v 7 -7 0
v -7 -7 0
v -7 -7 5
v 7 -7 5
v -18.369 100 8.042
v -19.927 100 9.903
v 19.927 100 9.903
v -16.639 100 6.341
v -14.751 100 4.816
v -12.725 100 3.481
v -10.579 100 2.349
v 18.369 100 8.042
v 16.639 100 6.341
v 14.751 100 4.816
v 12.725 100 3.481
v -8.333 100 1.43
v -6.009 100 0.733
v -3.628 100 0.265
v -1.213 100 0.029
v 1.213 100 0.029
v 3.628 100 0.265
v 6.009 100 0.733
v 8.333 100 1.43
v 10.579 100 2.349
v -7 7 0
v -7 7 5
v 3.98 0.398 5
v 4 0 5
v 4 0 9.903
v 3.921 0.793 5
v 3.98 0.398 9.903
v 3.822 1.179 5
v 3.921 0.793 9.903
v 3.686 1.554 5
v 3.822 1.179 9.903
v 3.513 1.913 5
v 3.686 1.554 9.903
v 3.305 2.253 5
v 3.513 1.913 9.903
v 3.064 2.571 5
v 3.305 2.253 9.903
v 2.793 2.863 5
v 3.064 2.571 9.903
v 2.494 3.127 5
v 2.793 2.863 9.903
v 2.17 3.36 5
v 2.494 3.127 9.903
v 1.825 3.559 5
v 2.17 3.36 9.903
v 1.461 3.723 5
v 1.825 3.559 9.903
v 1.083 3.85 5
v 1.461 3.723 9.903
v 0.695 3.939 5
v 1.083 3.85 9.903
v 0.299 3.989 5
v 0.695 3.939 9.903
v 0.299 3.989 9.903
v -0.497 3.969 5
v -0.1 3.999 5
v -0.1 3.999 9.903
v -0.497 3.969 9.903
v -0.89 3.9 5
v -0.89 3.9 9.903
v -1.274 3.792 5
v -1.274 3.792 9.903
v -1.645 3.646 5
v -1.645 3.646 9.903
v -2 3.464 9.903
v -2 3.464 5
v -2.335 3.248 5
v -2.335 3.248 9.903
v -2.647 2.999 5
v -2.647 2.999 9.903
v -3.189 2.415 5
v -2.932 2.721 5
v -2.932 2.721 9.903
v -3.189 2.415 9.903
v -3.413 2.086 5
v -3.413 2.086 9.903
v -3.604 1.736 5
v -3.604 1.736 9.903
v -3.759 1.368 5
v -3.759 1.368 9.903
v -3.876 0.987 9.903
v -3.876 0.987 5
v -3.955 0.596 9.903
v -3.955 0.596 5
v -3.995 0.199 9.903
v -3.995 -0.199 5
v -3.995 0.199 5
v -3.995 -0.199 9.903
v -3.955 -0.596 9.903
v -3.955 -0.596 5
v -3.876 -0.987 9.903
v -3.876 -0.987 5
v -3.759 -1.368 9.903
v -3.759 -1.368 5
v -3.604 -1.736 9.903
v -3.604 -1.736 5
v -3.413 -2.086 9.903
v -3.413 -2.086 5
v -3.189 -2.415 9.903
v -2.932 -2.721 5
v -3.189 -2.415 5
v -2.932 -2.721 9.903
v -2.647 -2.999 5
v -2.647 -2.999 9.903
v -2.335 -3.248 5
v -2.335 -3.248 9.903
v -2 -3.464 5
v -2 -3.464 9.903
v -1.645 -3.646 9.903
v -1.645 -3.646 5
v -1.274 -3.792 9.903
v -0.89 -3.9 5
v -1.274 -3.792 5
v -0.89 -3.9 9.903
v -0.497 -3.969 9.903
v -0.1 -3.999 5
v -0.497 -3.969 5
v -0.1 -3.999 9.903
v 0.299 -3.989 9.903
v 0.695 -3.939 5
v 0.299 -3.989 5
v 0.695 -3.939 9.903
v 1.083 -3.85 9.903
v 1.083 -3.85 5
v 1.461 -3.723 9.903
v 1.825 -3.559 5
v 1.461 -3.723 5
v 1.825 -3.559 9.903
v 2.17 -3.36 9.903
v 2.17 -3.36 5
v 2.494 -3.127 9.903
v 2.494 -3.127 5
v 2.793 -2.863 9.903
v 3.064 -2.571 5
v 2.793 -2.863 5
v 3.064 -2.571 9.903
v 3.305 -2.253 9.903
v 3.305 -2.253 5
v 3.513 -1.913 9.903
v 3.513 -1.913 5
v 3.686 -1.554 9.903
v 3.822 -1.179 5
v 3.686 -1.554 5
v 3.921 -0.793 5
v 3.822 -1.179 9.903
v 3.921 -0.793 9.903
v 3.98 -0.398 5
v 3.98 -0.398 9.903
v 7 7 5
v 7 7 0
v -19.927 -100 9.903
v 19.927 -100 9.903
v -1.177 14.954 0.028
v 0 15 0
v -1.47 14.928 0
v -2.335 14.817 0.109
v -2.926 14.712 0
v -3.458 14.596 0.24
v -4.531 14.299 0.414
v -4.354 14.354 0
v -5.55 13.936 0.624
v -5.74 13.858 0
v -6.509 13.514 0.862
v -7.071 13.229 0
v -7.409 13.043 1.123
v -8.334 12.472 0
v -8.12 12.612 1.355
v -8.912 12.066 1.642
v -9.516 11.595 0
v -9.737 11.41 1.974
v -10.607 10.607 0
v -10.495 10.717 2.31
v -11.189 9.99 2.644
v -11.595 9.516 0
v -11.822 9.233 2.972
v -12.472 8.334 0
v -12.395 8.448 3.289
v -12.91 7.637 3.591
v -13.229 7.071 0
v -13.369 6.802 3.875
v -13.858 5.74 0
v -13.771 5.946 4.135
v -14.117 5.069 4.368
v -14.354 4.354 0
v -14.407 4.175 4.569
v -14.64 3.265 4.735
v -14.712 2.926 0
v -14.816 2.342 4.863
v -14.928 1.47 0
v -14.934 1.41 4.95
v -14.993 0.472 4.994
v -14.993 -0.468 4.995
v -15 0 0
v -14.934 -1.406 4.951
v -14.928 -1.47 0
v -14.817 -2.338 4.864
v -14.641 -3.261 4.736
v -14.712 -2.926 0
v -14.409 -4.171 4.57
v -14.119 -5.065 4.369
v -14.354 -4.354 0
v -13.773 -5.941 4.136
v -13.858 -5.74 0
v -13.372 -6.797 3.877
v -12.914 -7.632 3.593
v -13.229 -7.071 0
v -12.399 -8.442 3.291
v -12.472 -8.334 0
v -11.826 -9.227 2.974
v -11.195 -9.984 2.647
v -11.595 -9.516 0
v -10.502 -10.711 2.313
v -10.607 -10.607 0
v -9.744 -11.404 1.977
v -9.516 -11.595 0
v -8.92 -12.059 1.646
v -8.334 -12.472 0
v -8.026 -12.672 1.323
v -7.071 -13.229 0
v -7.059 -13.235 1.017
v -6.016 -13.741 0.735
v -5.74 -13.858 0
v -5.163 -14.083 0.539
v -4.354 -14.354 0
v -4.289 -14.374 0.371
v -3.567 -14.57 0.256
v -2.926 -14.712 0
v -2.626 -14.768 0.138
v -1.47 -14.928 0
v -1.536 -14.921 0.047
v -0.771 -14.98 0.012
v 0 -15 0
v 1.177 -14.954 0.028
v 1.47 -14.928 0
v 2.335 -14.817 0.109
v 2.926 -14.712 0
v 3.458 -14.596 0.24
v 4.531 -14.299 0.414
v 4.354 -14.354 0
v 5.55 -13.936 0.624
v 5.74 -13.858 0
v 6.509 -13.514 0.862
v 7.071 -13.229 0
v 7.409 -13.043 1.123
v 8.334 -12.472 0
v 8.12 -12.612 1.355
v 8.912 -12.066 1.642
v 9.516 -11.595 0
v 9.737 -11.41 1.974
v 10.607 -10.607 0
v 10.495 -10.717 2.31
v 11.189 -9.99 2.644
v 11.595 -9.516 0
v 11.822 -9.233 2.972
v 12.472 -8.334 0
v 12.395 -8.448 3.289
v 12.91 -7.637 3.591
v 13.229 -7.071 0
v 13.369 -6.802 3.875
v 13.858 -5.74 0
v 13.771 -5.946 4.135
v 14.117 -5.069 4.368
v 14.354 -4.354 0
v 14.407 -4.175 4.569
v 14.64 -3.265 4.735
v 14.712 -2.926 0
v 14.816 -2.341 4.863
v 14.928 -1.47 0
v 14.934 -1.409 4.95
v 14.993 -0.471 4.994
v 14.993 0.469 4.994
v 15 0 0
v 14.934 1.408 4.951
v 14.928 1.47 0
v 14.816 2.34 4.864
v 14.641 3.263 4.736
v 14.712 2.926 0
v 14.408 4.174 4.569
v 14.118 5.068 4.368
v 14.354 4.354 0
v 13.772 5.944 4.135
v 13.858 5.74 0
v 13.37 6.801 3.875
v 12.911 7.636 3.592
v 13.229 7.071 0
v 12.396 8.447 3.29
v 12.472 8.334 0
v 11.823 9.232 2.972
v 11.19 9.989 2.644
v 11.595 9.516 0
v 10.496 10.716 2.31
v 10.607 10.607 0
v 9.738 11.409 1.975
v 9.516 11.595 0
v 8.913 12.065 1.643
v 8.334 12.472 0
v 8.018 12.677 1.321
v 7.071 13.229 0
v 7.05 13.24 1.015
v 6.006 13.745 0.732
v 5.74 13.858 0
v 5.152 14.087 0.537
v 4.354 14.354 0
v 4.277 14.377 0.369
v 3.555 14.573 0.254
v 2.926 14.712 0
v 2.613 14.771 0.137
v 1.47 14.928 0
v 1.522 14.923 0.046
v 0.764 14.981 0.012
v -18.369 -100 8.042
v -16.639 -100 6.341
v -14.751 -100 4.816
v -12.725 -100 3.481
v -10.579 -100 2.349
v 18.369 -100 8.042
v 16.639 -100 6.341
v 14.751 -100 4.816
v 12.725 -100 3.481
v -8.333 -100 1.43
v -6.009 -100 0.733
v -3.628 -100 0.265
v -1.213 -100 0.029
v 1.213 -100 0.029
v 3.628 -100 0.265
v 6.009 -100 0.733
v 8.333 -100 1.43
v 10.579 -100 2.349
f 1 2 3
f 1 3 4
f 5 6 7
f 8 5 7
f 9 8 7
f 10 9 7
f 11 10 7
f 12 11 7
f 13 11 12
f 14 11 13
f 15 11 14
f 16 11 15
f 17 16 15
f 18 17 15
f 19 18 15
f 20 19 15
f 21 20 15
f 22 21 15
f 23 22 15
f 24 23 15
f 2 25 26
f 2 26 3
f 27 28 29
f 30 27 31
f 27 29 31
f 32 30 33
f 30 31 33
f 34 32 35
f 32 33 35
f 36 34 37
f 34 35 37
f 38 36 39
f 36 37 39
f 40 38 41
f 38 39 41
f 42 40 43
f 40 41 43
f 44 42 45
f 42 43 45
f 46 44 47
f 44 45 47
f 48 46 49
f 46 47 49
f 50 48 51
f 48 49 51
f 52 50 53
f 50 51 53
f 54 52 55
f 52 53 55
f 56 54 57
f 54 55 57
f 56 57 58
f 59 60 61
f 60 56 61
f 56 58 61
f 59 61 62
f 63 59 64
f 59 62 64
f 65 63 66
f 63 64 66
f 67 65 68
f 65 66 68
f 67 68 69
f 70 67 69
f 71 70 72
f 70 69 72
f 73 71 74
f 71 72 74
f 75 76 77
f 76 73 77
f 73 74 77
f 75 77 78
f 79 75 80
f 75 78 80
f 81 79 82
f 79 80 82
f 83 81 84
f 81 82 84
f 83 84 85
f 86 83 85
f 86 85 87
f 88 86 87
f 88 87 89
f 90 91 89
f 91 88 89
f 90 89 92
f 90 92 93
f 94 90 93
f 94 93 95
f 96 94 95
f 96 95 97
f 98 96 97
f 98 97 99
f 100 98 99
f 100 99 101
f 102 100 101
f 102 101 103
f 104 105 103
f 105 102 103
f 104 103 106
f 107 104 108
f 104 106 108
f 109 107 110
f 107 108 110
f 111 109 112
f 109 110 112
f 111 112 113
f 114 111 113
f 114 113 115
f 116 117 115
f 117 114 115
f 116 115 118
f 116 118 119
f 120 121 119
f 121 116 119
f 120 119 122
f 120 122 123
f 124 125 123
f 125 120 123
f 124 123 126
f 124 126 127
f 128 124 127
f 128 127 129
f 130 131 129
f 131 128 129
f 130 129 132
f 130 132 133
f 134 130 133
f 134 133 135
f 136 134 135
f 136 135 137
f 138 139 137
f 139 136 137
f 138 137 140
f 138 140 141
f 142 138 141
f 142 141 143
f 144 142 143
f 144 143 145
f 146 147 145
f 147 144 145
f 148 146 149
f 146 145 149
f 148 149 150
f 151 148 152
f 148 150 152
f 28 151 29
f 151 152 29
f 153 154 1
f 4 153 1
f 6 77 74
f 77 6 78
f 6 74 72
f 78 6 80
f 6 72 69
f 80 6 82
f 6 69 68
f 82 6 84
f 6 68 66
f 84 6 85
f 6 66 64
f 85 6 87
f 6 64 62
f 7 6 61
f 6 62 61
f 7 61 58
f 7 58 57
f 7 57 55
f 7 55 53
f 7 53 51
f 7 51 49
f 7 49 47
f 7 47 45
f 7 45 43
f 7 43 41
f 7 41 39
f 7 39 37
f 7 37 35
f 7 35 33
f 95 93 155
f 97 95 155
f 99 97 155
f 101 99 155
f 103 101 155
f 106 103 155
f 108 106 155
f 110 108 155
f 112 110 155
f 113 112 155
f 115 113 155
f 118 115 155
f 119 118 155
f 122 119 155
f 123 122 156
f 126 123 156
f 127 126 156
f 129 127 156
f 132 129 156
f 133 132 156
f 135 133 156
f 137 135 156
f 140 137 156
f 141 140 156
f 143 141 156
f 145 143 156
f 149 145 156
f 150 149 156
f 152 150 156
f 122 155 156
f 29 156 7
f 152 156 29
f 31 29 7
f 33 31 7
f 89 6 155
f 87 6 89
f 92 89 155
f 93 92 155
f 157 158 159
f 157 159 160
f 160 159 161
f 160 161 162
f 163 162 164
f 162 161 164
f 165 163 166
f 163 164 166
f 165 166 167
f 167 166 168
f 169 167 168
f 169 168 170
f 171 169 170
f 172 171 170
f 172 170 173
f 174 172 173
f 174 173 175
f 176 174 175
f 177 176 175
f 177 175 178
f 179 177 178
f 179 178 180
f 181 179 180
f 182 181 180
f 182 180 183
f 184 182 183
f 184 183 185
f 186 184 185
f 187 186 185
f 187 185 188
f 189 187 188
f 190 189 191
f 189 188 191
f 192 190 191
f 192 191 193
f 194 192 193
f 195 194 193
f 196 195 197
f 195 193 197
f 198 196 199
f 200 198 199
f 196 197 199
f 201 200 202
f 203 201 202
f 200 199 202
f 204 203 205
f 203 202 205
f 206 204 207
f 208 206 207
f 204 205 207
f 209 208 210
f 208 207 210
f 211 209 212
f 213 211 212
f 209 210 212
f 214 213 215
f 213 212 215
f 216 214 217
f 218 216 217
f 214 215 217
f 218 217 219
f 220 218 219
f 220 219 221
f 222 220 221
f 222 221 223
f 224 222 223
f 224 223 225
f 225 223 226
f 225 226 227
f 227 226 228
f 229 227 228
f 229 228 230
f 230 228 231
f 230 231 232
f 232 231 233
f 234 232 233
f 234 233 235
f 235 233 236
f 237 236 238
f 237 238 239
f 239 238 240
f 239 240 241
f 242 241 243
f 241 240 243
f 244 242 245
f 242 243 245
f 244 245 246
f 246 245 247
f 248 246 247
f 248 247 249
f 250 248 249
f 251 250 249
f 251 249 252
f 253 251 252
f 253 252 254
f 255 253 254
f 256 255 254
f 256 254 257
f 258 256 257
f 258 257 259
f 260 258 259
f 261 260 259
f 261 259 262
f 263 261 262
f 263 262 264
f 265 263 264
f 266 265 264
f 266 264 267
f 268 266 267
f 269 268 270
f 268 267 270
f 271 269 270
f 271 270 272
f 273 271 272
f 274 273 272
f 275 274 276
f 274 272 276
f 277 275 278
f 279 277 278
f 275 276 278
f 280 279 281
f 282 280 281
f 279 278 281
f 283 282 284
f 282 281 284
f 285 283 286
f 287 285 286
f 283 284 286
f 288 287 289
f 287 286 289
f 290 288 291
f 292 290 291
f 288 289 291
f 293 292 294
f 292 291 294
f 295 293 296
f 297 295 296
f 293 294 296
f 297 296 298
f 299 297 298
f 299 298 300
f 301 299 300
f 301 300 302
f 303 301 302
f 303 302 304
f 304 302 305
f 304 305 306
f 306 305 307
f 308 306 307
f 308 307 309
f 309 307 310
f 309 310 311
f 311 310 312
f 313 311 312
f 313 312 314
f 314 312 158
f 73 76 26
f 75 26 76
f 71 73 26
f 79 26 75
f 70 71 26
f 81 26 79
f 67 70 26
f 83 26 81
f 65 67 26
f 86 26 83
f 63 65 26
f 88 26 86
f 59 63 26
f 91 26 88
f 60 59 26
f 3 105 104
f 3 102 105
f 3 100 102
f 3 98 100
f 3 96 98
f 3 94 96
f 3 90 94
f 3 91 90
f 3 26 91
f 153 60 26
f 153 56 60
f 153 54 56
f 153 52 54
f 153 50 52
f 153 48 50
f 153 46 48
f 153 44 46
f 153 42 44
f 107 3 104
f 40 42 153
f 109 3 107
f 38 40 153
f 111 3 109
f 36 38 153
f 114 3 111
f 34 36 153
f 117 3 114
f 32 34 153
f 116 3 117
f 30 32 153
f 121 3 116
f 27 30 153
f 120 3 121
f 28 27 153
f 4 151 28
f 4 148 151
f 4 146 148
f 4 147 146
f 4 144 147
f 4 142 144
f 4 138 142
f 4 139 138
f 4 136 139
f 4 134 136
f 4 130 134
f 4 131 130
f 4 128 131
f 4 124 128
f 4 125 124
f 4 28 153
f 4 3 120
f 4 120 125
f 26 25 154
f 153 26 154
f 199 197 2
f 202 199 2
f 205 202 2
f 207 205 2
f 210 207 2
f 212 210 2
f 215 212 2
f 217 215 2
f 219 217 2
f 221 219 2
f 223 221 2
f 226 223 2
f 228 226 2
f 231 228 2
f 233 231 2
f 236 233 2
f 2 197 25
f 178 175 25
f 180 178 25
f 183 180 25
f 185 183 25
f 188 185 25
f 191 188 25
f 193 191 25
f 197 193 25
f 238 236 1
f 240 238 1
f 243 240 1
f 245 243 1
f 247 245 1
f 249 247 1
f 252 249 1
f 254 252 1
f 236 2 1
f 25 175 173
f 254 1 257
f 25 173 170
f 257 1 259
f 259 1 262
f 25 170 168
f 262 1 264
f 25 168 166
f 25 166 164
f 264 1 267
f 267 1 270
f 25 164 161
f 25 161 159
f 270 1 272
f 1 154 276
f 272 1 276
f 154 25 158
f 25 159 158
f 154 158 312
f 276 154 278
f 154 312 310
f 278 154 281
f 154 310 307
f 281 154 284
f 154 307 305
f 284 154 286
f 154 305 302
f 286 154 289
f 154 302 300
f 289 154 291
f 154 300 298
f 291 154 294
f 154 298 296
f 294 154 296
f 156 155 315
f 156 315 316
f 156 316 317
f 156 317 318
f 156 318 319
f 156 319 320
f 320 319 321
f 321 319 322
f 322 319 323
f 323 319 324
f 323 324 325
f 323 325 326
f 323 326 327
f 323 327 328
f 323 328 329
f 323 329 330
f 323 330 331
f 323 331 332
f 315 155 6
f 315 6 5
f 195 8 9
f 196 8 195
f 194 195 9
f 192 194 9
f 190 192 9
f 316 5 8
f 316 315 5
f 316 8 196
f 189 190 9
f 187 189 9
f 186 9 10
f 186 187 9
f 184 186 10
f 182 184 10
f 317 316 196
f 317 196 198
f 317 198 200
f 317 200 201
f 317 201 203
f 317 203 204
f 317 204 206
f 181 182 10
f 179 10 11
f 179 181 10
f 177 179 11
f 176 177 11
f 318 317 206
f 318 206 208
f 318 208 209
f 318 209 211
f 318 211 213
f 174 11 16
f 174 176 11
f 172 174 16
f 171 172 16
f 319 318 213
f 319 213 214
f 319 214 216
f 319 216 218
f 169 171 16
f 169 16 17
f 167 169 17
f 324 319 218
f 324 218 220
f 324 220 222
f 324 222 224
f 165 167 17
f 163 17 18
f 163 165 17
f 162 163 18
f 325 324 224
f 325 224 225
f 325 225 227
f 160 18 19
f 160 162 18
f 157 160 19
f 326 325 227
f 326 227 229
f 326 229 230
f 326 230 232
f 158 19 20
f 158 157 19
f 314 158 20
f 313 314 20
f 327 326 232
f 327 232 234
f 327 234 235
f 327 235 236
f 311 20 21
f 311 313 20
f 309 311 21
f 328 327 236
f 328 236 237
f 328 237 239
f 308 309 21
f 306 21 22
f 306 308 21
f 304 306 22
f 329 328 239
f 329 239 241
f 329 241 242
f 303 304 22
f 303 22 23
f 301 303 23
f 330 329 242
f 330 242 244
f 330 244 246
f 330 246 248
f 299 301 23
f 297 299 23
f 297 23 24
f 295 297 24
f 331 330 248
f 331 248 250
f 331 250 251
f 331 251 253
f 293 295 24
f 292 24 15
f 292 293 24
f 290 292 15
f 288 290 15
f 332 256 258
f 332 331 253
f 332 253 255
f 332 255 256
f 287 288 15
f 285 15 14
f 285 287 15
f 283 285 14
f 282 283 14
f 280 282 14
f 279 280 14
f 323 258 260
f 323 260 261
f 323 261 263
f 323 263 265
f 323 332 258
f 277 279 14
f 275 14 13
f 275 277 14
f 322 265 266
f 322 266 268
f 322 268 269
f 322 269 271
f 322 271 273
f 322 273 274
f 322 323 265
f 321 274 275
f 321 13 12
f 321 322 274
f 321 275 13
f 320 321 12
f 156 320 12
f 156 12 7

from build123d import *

# Parameters (mm, degrees)
F0_R          = 15
F1_DEPTH      = 10
F3_DEPTH      = 100
F3_DEPTH_BACK = 100
F4_DEPTH      = 100
F4_DEPTH_BACK = 100
F5_R          = 4
F6_DEPTH      = 25
F7_W          = 14
F7_H          = 14
F7_R          = 4
F8_DEPTH      = 5


with BuildPart() as f1:
    # F0 (on Top) → F1 (new body)
    with BuildSketch(Plane.XY):
        Circle(F0_R)
    extrude(amount=F1_DEPTH)

    # F2 (on Front) → F3 (join, two sides)
    with BuildSketch(Plane.XZ) as f3_sk:
        with BuildLine():
            Line((19.9266501849, 9.9026951939), (-19.9266501849, 9.9026951939))
            ThreePointArc((-19.9266501849, 9.9026951939), (0, 0), (19.9266501849, 9.9026951939))
        make_face()
        with BuildLine():
            ThreePointArc((19.9266501849, 9.9026951939), (23.6977451947, 17.0365288543), (25, 25))
            ThreePointArc((25, 25), (-7.9634711457, 48.6977451947), (-19.9266501849, 9.9026951939))
            Line((-19.9266501849, 9.9026951939), (19.9266501849, 9.9026951939))
        make_face()
    extrude(amount=F3_DEPTH)
    extrude(f3_sk.sketch, amount=-F3_DEPTH_BACK)

    # F2 (on Front) → F4 (cut, two sides)
    with BuildSketch(Plane.XZ) as f4_sk:
        with BuildLine():
            ThreePointArc((-19.9266501849, 9.9026951939), (-7.9634711457, 48.6977451947), (25, 25))
            ThreePointArc((25, 25), (23.6977451947, 17.0365288543), (19.9266501849, 9.9026951939))
            Line((19.9266501849, 9.9026951939), (43.9491011202, 9.9026951939))
            Line((43.9491011202, 9.9026951939), (43.9491011202, 56.3038922846))
            Line((43.9491011202, 56.3038922846), (-35.4610793293, 56.3038922846))
            Line((-35.4610793293, 56.3038922846), (-35.4610793293, 9.9026951939))
            Line((-35.4610793293, 9.9026951939), (-19.9266501849, 9.9026951939))
        make_face()
        with BuildLine():
            ThreePointArc((19.9266501849, 9.9026951939), (23.6977451947, 17.0365288543), (25, 25))
            ThreePointArc((25, 25), (-7.9634711457, 48.6977451947), (-19.9266501849, 9.9026951939))
            Line((-19.9266501849, 9.9026951939), (19.9266501849, 9.9026951939))
        make_face()
    extrude(amount=-F4_DEPTH, mode=Mode.SUBTRACT)
    extrude(f4_sk.sketch, amount=F4_DEPTH_BACK, mode=Mode.SUBTRACT)

    # F5 (on face) → F6 (cut)
    with BuildSketch(Plane.XY.offset(9.9026951939)):
        Circle(F5_R)
    extrude(amount=-F6_DEPTH, mode=Mode.SUBTRACT)

    # F7 (on face) → F8 (cut)
    with BuildSketch(Plane(origin=(0, 0, 0), x_dir=(1, 0, 0), z_dir=(0, 0, -1))):
        Rectangle(F7_W, F7_H)
        Circle(F7_R, mode=Mode.SUBTRACT)
    extrude(amount=-F8_DEPTH, mode=Mode.SUBTRACT)


solid = f1.part
